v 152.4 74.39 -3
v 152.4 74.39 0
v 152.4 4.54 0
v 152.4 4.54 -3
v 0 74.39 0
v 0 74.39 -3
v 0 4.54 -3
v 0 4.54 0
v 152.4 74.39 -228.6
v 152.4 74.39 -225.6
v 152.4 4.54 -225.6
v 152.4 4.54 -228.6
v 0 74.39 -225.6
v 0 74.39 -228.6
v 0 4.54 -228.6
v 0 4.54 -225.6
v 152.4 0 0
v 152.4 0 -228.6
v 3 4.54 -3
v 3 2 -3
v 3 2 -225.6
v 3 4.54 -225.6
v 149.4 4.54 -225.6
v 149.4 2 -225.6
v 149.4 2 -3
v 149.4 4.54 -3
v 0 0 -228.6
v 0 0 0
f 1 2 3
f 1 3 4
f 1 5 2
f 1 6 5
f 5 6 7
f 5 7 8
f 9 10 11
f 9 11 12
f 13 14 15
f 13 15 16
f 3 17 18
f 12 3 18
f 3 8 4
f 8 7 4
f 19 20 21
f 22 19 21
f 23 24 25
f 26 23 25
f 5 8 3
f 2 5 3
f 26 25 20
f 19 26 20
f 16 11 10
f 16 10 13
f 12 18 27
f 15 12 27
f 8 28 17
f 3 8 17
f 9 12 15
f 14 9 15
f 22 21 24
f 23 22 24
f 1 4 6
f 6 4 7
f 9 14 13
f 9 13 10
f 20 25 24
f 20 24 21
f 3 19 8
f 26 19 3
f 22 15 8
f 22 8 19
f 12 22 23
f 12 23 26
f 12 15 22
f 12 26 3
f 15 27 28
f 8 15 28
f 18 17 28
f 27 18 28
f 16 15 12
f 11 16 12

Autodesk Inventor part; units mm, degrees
ref_plane "YZ Plane" through (0, 0, 0) normal (1, 0, 0) x (0, 1, 0)
ref_plane "XZ Plane" through (0, 0, 0) normal (0, 1, 0) x (-1, 0, 0)
ref_plane "XY Plane" through (0, 0, 0) normal (0, 0, 1) x (1, 0, 0)
sketch "Sketch1" plane through (0, 0, 0) normal (0, 1, 0) x (-1, 0, 0)
  line L0 (0, 0) -> (-152.4, 0)
  line L1 (-152.4, 0) -> (-152.4, -228.6)
  line L2 (-152.4, -228.6) -> (0, -228.6)
  line L3 (0, -228.6) -> (0, 0)
  dimension "d0" = 152.4
  dimension "d1" = 228.6
extrude "Extrusion1" add sketch "Sketch1" along normal blind 2
sketch "Sketch3" plane through (0, 2, 0) normal (0, 1, 0) x (1, 0, 0)
  line L0 (152.4, 0) -> (152.4, 228.6) projected
  line L1 (152.4, 228.6) -> (0, 228.6) projected
  line L2 (0, 228.6) -> (0, 0) projected
  line L3 (0, 0) -> (152.4, 0) projected
  line L4 (3, 3) -> (3, 225.6)
  line L5 (3, 225.6) -> (149.4, 225.6)
  line L6 (149.4, 225.6) -> (149.4, 3)
  line L7 (149.4, 3) -> (3, 3)
  dimension "d13" = 3
extrude "Extrusion2" add sketch "Sketch3" along normal blind 2.54
sketch "Sketch4" plane through (0, 4.54, 0) normal (0, 1, 0) x (1, 0, 0)
  line L0 (152.4, 228.6) -> (0, 228.6) projected
  line L1 (0, 228.6) -> (0, 0) projected
  line L2 (0, 0) -> (152.4, 0) projected
  line L3 (152.4, 0) -> (152.4, 228.6) projected
  line L4 (3, 3) -> (3, 225.6) projected
  line L5 (3, 225.6) -> (149.4, 225.6) projected
  line L6 (149.4, 225.6) -> (149.4, 3) projected
  line L7 (149.4, 3) -> (3, 3) projected
  line L8 (152.4, 225.6) -> (0, 225.6)
  line L9 (0, 225.6) -> (0, 228.6)
  line L10 (0, 228.6) -> (152.4, 228.6)
  line L11 (152.4, 228.6) -> (152.4, 225.6)
  line L12 (0, 0) -> (152.4, 0)
  line L13 (152.4, 0) -> (152.4, 3)
  line L14 (152.4, 3) -> (0, 3)
  line L15 (0, 3) -> (0, 0)
extrude "Extrusion3" add sketch "Sketch4" along normal blind 69.85 separate body contours L3 L8 L5 L1 L0 | L3 L2 L1 L14 L7
properties part number "testbase"
